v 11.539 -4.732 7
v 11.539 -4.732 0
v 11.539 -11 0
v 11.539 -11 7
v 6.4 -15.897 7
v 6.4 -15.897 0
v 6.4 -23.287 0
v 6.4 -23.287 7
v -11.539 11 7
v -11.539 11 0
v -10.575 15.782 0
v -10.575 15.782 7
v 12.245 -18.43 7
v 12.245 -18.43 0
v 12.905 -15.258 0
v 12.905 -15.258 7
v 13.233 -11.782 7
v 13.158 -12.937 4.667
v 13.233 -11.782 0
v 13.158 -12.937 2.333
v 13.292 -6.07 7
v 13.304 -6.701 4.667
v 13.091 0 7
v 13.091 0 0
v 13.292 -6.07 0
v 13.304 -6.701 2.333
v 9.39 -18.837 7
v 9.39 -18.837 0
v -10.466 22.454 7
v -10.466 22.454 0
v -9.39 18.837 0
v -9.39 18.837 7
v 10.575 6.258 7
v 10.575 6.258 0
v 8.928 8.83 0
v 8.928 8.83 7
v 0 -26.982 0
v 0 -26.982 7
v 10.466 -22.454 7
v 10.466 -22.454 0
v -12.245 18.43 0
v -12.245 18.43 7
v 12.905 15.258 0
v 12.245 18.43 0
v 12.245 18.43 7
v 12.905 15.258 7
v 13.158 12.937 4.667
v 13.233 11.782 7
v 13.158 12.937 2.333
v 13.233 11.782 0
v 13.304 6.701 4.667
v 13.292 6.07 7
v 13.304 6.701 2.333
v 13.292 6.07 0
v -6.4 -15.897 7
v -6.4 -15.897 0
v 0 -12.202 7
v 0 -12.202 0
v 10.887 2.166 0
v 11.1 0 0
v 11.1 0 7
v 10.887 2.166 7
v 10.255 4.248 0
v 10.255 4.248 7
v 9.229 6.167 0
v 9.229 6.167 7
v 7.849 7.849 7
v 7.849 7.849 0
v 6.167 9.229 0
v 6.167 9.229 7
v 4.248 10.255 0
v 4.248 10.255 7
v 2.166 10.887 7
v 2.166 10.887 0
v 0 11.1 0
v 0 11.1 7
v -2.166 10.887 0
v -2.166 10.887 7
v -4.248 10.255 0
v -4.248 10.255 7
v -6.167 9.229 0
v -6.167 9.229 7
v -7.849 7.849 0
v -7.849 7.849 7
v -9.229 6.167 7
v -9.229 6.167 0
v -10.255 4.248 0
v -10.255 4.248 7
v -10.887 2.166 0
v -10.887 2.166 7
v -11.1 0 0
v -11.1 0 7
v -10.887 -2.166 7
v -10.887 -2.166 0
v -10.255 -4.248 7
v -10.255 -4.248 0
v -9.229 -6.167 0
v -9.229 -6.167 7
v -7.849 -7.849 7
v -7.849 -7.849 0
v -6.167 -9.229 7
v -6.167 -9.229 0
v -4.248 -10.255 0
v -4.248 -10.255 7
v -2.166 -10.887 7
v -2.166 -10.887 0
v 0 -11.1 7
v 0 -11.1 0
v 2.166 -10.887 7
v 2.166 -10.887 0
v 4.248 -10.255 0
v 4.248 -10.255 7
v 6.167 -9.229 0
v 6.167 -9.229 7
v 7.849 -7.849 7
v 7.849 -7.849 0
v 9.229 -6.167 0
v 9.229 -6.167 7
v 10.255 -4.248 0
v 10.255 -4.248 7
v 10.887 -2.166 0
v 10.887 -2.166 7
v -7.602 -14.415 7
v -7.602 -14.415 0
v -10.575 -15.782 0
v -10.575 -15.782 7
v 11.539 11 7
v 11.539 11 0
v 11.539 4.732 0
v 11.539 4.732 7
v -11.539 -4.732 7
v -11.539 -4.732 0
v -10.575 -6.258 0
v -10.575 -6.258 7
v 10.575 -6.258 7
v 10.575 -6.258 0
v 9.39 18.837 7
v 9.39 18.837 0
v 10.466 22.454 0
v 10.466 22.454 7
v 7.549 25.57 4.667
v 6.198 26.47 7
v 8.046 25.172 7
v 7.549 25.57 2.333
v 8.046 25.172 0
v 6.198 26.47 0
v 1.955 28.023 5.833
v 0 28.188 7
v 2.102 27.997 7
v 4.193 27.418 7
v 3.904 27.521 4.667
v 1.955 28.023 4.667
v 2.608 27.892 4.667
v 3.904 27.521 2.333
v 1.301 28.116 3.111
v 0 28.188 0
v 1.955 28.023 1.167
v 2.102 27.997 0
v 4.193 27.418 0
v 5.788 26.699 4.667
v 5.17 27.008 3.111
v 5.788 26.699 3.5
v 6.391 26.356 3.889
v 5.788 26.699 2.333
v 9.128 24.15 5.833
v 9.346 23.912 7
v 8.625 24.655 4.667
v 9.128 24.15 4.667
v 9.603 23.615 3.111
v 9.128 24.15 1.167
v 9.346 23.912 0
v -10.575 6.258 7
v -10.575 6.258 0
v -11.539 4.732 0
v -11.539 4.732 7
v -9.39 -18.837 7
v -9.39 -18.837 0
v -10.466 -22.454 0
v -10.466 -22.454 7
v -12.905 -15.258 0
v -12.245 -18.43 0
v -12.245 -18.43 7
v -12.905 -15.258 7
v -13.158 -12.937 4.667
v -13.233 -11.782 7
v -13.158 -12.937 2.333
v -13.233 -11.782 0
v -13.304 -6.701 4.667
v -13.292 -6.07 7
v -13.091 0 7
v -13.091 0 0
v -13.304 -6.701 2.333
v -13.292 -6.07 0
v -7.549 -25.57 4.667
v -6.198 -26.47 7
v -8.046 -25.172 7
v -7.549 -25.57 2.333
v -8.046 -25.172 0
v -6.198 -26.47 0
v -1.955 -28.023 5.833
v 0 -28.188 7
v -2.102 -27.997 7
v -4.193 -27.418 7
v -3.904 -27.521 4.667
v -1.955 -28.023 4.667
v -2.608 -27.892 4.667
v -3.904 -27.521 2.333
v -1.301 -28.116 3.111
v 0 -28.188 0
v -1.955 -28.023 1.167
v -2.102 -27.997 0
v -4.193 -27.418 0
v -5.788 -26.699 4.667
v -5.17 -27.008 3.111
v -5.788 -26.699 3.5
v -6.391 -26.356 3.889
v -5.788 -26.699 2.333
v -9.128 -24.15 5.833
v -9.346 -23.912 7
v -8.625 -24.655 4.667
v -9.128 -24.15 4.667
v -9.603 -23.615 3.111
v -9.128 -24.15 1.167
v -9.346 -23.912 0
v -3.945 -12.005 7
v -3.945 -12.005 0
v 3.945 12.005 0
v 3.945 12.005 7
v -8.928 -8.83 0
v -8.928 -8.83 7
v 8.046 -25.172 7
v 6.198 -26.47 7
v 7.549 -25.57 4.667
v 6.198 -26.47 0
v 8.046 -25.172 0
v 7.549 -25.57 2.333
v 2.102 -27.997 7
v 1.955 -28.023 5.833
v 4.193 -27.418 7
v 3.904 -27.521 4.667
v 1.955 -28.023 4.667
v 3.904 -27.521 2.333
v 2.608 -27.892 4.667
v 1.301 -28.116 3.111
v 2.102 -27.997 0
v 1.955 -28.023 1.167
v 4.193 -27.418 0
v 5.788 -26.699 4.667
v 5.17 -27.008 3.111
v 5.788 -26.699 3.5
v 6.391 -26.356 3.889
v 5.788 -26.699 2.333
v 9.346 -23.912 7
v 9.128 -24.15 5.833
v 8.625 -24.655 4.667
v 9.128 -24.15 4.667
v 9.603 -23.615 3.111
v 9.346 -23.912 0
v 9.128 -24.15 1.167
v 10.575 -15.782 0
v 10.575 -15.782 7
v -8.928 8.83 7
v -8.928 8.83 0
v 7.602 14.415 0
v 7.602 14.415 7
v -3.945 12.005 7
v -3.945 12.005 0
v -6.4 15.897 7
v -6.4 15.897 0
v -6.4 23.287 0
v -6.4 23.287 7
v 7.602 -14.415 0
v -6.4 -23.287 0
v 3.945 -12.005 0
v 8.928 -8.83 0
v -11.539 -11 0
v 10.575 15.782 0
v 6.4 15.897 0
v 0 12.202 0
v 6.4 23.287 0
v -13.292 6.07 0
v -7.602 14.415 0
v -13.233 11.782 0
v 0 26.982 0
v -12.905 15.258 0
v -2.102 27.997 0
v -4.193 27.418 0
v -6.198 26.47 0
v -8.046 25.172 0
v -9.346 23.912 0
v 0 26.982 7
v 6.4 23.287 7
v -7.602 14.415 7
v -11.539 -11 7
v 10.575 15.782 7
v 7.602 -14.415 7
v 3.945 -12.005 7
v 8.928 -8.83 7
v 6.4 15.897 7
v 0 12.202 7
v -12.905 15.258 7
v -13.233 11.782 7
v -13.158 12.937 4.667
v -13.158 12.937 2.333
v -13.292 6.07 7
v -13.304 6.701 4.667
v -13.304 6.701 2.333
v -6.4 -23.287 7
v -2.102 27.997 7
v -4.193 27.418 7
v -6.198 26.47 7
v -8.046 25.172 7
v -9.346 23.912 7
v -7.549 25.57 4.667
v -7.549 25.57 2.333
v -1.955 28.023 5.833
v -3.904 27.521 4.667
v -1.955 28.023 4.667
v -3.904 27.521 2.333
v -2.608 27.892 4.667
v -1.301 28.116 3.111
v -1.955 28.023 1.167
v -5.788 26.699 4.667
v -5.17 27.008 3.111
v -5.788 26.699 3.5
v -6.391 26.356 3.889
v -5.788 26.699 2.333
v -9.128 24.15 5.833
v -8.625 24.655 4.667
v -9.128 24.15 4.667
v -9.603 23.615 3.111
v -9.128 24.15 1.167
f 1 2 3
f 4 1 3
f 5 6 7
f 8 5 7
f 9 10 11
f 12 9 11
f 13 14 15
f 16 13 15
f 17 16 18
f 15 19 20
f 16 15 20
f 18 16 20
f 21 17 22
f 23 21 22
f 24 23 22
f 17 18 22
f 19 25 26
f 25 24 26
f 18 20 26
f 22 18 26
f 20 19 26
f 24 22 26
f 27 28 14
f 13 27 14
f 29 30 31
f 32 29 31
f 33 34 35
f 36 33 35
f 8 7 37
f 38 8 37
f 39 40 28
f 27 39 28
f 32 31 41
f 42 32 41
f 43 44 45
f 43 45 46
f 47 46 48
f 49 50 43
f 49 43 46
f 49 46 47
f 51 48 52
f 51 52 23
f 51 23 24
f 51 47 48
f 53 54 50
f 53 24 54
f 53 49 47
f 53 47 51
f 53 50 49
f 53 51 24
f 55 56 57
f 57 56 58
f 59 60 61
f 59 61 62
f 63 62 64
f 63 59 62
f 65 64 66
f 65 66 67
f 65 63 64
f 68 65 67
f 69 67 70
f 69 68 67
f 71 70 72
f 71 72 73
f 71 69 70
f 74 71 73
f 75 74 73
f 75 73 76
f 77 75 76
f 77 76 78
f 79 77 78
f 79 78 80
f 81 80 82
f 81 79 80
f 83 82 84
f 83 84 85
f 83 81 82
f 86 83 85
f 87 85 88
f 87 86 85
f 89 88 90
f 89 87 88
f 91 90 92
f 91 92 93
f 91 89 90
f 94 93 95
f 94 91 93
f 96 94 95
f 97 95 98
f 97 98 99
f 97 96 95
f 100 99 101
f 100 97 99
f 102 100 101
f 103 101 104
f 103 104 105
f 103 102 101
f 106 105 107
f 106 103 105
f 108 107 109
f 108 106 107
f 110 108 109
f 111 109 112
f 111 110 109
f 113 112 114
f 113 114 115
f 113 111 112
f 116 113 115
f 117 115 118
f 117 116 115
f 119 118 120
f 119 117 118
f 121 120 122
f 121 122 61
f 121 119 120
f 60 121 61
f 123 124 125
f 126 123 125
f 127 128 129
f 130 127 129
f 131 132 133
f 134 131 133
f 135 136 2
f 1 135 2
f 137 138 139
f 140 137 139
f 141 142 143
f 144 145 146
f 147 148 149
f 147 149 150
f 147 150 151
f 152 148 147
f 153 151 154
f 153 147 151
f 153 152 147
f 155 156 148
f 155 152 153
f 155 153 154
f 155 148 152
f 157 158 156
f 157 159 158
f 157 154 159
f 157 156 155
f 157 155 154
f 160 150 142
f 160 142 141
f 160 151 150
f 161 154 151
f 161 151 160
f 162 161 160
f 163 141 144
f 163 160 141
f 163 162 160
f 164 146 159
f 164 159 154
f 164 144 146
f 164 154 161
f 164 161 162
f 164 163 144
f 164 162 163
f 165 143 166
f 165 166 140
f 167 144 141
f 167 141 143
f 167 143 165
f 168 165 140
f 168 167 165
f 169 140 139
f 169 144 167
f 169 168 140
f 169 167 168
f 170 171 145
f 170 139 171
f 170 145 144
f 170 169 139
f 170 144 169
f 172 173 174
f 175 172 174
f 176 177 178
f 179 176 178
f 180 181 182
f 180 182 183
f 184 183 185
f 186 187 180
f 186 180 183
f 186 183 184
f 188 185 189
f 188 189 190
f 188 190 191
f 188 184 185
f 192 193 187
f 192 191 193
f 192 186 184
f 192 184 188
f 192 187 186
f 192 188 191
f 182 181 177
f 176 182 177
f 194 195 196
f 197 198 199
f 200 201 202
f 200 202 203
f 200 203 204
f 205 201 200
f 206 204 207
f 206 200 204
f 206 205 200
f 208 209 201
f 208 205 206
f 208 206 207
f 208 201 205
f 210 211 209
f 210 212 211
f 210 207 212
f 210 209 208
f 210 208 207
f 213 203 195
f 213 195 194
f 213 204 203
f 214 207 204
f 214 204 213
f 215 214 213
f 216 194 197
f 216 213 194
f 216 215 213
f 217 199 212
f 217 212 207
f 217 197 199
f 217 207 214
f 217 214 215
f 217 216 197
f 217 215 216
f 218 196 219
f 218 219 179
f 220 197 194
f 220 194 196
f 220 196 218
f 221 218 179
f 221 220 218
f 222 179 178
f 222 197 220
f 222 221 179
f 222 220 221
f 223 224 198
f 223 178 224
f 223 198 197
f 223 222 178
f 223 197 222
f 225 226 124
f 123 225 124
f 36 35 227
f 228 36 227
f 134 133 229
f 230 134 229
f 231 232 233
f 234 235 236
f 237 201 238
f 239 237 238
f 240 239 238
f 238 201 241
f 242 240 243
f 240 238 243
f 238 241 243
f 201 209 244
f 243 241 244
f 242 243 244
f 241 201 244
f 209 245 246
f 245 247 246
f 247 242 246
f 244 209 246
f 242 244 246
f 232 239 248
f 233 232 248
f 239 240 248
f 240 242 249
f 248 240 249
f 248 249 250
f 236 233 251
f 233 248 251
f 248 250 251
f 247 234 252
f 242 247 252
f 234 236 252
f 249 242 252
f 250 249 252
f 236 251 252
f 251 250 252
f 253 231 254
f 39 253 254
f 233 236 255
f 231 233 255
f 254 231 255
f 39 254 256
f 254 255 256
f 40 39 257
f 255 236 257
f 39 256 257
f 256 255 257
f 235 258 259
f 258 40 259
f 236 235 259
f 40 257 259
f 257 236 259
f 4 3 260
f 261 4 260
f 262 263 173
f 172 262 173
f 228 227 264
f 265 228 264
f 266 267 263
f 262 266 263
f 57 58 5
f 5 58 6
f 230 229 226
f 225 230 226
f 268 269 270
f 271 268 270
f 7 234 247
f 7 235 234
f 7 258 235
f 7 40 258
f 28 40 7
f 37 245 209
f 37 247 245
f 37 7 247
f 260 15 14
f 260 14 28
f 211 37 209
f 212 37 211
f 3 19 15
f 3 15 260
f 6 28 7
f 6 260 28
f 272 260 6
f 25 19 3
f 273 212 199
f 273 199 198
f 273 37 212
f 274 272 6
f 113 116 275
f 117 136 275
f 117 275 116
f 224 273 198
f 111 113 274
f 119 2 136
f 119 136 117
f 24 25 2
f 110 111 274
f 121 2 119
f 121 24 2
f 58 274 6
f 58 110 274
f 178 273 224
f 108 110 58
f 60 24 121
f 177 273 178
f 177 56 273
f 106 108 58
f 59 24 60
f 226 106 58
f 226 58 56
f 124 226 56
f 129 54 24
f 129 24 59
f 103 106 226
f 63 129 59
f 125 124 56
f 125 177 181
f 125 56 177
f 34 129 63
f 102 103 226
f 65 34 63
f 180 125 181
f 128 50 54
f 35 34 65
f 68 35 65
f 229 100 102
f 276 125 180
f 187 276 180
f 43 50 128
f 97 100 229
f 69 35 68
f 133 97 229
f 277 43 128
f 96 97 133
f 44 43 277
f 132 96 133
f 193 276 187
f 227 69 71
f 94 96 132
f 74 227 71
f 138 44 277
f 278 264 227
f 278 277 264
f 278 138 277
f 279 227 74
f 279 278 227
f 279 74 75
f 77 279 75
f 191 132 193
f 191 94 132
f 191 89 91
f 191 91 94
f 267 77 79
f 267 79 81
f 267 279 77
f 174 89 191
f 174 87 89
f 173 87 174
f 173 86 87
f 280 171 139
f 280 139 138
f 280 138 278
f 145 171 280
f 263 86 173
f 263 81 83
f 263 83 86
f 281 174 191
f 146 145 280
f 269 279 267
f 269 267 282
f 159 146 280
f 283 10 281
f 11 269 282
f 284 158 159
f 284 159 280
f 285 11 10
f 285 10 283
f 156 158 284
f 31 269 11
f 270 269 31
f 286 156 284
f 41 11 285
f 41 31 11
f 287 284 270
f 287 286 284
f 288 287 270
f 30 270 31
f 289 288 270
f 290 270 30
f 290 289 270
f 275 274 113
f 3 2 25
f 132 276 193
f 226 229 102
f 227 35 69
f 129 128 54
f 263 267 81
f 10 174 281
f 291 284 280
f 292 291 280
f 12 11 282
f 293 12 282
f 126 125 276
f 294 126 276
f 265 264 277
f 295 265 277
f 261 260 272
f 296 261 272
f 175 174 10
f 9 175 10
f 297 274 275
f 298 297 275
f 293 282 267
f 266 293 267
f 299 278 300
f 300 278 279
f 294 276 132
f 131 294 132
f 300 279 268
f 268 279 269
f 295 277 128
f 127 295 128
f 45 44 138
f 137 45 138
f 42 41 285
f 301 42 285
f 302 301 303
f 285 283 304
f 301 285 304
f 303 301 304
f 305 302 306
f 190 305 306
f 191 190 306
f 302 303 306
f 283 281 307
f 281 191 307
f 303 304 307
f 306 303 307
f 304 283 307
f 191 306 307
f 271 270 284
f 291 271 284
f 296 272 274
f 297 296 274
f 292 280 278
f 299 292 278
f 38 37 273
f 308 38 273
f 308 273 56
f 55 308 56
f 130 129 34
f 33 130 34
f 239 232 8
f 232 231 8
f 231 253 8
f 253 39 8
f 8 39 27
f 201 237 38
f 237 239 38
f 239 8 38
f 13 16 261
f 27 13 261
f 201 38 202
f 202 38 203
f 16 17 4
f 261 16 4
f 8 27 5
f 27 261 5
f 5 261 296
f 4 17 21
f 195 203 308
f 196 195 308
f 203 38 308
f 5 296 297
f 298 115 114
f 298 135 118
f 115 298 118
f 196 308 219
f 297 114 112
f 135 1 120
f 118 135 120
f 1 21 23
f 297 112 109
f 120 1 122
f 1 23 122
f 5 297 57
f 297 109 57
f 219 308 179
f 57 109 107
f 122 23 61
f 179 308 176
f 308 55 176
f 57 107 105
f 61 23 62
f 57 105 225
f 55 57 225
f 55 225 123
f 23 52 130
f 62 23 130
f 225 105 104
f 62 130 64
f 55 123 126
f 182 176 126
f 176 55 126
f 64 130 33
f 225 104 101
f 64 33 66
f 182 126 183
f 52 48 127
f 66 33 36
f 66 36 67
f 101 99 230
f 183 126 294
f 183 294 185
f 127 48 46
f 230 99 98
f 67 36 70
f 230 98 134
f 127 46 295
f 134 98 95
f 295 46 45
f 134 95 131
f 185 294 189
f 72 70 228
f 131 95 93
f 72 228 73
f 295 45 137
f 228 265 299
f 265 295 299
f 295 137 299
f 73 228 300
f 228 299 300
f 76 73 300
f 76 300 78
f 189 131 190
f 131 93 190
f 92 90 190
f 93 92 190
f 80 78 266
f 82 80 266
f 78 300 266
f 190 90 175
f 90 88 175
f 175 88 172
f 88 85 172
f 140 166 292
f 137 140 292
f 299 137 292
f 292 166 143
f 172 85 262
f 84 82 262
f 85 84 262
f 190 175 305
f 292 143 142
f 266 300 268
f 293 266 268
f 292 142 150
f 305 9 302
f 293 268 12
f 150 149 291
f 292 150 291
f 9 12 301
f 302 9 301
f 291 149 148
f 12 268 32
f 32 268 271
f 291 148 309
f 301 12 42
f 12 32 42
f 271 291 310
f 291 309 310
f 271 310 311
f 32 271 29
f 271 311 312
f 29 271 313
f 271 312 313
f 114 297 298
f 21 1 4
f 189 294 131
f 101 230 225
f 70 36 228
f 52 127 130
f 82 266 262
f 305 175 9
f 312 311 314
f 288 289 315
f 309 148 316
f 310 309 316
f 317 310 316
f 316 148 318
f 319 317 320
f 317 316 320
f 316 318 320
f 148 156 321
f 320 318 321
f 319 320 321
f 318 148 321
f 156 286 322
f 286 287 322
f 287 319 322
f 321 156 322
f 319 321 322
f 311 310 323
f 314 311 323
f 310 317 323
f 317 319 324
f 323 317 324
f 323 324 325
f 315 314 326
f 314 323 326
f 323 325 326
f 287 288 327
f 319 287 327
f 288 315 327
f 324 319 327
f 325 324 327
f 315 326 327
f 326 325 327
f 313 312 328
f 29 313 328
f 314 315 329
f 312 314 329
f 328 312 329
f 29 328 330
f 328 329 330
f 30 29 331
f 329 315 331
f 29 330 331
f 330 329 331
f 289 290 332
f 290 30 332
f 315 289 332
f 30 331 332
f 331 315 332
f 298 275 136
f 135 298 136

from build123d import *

# Parameters (mm, degrees)
F0_R     = 11.1
F1_DEPTH = 7


with BuildPart() as f1:
    # F0 (on Top) → F1 (new body)
    with BuildSketch(Plane.XY):
        with BuildLine():
            add(Edge.make_bspline(
                [(0, 28.1878467649), (3.8763035152, 28.2040634856), (8.0688480164, 26.1116467562), (10.4658603604, 22.4543227052)],
                knots=[0, 0, 0, 0, 0.4129058091, 0.4129058091, 0.4129058091, 0.4129058091], degree=3))
            add(Edge.make_bspline(
                [(0, 28.1878467649), (-3.8763035152, 28.2040634856), (-8.0688480164, 26.1116467562), (-10.4658603604, 22.4543227052)],
                knots=[0, 0, 0, 0, 0.4129058091, 0.4129058091, 0.4129058091, 0.4129058091], degree=3))
            Line((-10.4658603604, 22.4543227052), (-9.3901595101, 18.8373755664))
            Line((-9.3901595101, 18.8373755664), (-12.2452968513, 18.429759182))
            add(Edge.make_bspline(
                [(-12.2452968513, 18.429759182), (-13.6777081897, 13.4016693255), (-13.3470218498, 6.8416931392), (-13.0910407752, 0)],
                knots=[0.5468406746, 0.5468406746, 0.5468406746, 0.5468406746, 1, 1, 1, 1], degree=3))
            add(Edge.make_bspline(
                [(-12.2452968513, -18.429759182), (-13.6777081897, -13.4016693255), (-13.3470218498, -6.8416931392), (-13.0910407752, 0)],
                knots=[0.5468406746, 0.5468406746, 0.5468406746, 0.5468406746, 1, 1, 1, 1], degree=3))
            Line((-12.2452968513, -18.429759182), (-9.3901595101, -18.8373755664))
            Line((-9.3901595101, -18.8373755664), (-10.4658603604, -22.4543227052))
            add(Edge.make_bspline(
                [(0, -28.1878467649), (-3.8763035152, -28.2040634856), (-8.0688480164, -26.1116467562), (-10.4658603604, -22.4543227052)],
                knots=[0, 0, 0, 0, 0.4129058091, 0.4129058091, 0.4129058091, 0.4129058091], degree=3))
            add(Edge.make_bspline(
                [(0, -28.1878467649), (3.8763035152, -28.2040634856), (8.0688480164, -26.1116467562), (10.4658603604, -22.4543227052)],
                knots=[0, 0, 0, 0, 0.4129058091, 0.4129058091, 0.4129058091, 0.4129058091], degree=3))
            Line((10.4658603604, -22.4543227052), (9.3901595101, -18.8373755664))
            Line((9.3901595101, -18.8373755664), (12.2452968513, -18.429759182))
            add(Edge.make_bspline(
                [(12.2452968513, -18.429759182), (13.6777081897, -13.4016693255), (13.3470218498, -6.8416931392), (13.0910407752, 0)],
                knots=[0.5468406746, 0.5468406746, 0.5468406746, 0.5468406746, 1, 1, 1, 1], degree=3))
            add(Edge.make_bspline(
                [(12.2452968513, 18.429759182), (13.6777081897, 13.4016693255), (13.3470218498, 6.8416931392), (13.0910407752, 0)],
                knots=[0.5468406746, 0.5468406746, 0.5468406746, 0.5468406746, 1, 1, 1, 1], degree=3))
            Line((12.2452968513, 18.429759182), (9.3901595101, 18.8373755664))
            Line((9.3901595101, 18.8373755664), (10.4658603604, 22.4543227052))
        make_face()
        Polygon((-11.5394731984, -4.7315182164), (-10.5750951916, -6.2584495172), (-8.9276162907, -8.8301226497), (-3.9449990727, -12.0045328513), (-7.601597812, -14.4154764712), (-10.5750951916, -15.7816782594), (-11.5394731984, -10.9999720007), align=None, mode=Mode.SUBTRACT)
        Polygon((-6.4, -23.2869711138), (-6.4, -15.8968876682), (0, -12.2018459454), (6.4, -15.8968876682), (6.4, -23.2869711138), (0, -26.9820128367), align=None, mode=Mode.SUBTRACT)
        Polygon((8.9276162907, -8.8301226497), (10.5750951916, -6.2584495172), (11.5394731984, -4.7315182164), (11.5394731984, -10.9999720007), (10.5750951916, -15.7816782594), (7.601597812, -14.4154764712), (3.9449990727, -12.0045328513), align=None, mode=Mode.SUBTRACT)
        Polygon((-8.9276162907, 8.8301226497), (-10.5750951916, 6.2584495172), (-11.5394731984, 4.7315182164), (-11.5394731984, 10.9999720007), (-10.5750951916, 15.7816782594), (-7.601597812, 14.4154764712), (-3.9449990727, 12.0045328513), align=None, mode=Mode.SUBTRACT)
        Circle(F0_R, mode=Mode.SUBTRACT)
        Polygon((3.9449990727, 12.0045328513), (7.601597812, 14.4154764712), (10.5750951916, 15.7816782594), (11.5394731984, 10.9999720007), (11.5394731984, 4.7315182164), (10.5750951916, 6.2584495172), (8.9276162907, 8.8301226497), align=None, mode=Mode.SUBTRACT)
        Polygon((0, 26.9820128367), (6.4, 23.2869711138), (6.4, 15.8968876682), (0, 12.2018459454), (-6.4, 15.8968876682), (-6.4, 23.2869711138), align=None, mode=Mode.SUBTRACT)
    extrude(amount=F1_DEPTH)


solid = f1.part
